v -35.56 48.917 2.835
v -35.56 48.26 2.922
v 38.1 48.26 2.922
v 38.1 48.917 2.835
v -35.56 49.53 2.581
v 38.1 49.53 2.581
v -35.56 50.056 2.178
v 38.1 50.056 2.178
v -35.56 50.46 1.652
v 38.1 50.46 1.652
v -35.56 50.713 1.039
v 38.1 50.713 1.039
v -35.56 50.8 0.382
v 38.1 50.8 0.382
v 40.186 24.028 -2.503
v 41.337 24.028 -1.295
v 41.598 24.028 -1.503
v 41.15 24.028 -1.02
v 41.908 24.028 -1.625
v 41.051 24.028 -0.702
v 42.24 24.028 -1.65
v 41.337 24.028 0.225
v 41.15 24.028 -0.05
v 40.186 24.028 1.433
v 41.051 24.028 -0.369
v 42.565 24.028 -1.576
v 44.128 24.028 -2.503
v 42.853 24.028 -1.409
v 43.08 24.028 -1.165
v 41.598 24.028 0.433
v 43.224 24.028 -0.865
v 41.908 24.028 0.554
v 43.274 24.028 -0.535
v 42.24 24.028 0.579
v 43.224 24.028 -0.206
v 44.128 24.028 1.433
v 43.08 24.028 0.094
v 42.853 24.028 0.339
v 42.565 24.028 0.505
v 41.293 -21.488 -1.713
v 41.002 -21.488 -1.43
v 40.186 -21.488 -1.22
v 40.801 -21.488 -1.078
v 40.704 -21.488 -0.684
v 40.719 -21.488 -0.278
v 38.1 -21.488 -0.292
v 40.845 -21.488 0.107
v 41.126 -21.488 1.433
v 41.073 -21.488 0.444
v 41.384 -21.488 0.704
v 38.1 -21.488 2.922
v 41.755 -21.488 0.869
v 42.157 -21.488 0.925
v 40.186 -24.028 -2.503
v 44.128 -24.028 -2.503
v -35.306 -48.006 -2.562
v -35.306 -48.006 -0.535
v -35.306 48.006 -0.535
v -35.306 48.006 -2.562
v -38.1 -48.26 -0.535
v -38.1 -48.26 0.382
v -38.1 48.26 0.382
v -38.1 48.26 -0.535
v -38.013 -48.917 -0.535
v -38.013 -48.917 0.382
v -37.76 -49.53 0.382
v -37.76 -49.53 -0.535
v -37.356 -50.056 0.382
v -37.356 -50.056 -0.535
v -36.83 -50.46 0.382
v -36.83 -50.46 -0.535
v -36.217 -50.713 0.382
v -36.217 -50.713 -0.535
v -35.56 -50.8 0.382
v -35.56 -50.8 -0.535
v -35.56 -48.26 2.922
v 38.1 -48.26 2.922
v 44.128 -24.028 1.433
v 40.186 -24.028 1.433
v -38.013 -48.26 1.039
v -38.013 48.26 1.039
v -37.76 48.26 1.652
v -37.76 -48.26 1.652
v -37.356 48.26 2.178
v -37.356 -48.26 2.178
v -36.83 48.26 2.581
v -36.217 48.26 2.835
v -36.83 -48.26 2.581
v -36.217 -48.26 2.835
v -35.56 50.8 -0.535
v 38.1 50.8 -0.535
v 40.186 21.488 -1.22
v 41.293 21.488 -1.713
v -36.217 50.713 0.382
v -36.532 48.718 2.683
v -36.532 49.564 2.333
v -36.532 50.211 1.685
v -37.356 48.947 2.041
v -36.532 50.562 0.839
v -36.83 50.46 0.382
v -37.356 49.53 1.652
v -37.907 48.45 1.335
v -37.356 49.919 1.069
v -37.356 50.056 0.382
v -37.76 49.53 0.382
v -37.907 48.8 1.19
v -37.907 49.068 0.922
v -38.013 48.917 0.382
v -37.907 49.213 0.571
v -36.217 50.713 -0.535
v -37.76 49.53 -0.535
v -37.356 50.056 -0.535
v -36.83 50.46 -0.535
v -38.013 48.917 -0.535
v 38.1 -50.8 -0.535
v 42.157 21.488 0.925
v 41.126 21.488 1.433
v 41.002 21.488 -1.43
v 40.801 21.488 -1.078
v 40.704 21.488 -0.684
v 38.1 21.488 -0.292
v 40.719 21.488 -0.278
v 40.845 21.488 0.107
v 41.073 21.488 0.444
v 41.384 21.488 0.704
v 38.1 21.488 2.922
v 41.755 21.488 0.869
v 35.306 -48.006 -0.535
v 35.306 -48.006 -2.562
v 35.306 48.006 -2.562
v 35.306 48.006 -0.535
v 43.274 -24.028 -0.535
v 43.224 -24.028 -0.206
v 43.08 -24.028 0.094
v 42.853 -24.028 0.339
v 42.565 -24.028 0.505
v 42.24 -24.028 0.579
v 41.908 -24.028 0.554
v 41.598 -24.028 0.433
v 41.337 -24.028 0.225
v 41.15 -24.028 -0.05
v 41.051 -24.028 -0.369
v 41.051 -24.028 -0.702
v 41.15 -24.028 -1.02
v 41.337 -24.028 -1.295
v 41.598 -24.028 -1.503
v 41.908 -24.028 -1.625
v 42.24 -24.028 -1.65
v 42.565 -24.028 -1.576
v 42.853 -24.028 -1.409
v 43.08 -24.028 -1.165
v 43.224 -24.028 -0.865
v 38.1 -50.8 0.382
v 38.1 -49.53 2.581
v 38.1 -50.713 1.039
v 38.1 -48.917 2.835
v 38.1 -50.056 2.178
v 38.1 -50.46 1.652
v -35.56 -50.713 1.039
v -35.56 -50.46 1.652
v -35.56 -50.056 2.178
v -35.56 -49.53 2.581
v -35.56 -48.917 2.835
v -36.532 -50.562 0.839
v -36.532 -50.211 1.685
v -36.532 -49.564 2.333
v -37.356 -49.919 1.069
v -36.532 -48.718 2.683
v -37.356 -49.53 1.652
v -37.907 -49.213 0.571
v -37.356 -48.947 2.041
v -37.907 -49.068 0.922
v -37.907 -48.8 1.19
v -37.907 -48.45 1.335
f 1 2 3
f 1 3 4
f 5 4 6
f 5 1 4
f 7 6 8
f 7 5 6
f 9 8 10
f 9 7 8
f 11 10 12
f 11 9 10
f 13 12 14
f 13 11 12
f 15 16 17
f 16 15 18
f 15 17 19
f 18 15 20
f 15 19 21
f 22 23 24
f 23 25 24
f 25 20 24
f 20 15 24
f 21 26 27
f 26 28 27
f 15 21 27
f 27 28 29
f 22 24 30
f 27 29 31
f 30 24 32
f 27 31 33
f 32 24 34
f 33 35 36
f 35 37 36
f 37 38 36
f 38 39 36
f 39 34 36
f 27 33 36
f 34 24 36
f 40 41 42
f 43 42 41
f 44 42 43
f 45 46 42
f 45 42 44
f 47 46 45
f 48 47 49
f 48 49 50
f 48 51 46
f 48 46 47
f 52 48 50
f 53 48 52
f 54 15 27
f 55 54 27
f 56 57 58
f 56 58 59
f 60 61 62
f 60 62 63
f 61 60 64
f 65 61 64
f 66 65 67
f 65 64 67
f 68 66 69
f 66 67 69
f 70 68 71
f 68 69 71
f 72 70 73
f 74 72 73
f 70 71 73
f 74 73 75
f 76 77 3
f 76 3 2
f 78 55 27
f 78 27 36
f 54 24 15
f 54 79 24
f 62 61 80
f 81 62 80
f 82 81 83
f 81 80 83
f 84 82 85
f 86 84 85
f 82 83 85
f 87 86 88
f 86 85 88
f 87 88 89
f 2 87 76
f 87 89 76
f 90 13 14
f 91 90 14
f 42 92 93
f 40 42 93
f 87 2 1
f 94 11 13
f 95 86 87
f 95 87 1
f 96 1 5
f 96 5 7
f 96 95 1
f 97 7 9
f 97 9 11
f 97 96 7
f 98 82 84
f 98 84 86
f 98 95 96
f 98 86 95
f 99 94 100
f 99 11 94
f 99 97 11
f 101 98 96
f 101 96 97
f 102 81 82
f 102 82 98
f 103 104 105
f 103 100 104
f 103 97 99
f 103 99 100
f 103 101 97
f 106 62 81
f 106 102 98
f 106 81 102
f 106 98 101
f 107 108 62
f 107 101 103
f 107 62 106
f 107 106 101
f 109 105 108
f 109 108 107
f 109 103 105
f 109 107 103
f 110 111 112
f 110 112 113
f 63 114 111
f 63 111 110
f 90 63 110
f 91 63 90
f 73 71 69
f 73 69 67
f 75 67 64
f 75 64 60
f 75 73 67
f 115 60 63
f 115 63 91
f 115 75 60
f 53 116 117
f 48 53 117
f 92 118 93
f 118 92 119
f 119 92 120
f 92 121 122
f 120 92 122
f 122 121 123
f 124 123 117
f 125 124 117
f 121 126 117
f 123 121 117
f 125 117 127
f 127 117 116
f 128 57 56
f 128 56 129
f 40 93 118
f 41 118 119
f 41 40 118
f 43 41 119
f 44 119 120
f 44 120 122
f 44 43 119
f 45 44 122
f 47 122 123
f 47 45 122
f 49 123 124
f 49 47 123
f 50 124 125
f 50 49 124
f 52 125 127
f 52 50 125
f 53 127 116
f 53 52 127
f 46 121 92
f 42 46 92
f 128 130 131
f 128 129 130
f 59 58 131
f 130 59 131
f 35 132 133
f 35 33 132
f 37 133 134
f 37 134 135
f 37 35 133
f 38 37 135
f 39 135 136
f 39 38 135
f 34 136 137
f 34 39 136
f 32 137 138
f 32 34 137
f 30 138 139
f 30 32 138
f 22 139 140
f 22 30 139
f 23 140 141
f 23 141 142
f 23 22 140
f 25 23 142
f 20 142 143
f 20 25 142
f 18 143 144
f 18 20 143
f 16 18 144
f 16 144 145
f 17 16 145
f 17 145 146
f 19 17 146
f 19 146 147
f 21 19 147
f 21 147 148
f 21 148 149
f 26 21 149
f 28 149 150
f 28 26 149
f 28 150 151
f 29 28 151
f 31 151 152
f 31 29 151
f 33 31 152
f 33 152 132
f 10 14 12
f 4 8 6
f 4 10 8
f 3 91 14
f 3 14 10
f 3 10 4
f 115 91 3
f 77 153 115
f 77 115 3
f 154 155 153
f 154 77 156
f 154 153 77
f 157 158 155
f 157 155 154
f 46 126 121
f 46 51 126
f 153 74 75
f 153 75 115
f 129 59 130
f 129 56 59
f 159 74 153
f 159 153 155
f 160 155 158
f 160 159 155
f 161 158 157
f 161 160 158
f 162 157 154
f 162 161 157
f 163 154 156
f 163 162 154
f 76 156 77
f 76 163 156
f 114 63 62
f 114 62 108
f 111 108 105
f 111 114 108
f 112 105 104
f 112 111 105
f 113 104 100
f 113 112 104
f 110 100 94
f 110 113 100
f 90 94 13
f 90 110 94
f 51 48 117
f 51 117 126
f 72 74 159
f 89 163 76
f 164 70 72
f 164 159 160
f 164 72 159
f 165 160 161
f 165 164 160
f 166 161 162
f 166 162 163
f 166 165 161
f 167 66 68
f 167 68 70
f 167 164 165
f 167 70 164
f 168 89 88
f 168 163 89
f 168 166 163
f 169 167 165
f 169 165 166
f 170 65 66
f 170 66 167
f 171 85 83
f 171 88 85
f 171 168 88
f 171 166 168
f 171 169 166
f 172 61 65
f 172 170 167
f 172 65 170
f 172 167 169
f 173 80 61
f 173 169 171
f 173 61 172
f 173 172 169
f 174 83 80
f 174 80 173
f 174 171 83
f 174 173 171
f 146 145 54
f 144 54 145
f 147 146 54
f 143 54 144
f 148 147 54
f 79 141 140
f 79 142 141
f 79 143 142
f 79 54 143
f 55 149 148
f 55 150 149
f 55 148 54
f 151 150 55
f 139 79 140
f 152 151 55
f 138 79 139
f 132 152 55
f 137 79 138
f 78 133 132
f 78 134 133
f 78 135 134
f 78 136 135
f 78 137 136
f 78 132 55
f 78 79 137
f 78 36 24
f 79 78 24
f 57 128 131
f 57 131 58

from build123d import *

# Parameters (mm, degrees)
F1_DEPTH     = 50.8
F2_DEPTH     = 48.006
F3_R         = 2.54
F4_T1_DEPTH  = 7.2669304909
F4_S5_W      = 2.54
F4_S5_H      = 2.54
F4_T6_DEPTH  = 2.54
F4_S11_W     = 2.54
F4_S11_H     = 2.54
F4_T12_DEPTH = 2.54
F0_R         = 1.1176
F5_DEPTH     = 24.0284
F6_DEPTH     = 21.4884


# Not quite as in the source:
# - a fillet or chamfer that OpenCascade refuses, or shapes differently, is made with other operations: its cross-section is extruded or revolved along the edge and cut away or added
# - ends of sketch curves that miss each other by under 0.0002 mm in the source are joined


with BuildPart() as f1:
    # F0 (on Front) → F1 (new body, symmetric)
    with BuildSketch(Plane.XZ):
        Polygon((35.306, -0.5352410823), (38.1, -0.5352410823), (38.1, -0.2915388458), (38.1, 2.9216894086), (-38.1, 2.9216894086), (-38.1, -0.5352410823), (-35.306, -0.5352410823), align=None)
    extrude(amount=F1_DEPTH, both=True)

    # F3
    f3_edges = [f1.edges().sort_by_distance(p)[0] for p in [
        (0, 50.8, 2.921689),
        (-38.1, 0, 2.921689),
        (0, -50.8, 2.921689),
    ]]
    fillet(f3_edges, radius=F3_R)

    # F4: fillet of radius 2.54 on 4 edges, made by hand

    # F4_s2 → F4_t1 (cut)
    with BuildSketch(Plane.XY.offset(-6.8852410823)):
        with BuildLine():
            ThreePointArc((-38.1, 48.26), (-37.3560512242, 50.0560512242), (-35.56, 50.8))
            Line((-35.56, 50.8), (-38.1, 50.8))
            Line((-38.1, 50.8), (-38.1, 48.26))
        make_face()
        with BuildLine():
            ThreePointArc((-38.1, -48.26), (-37.3560512242, -50.0560512242), (-35.56, -50.8))
            Line((-35.56, -50.8), (-38.1, -50.8))
            Line((-38.1, -50.8), (-38.1, -48.26))
        make_face()
    extrude(amount=F4_T1_DEPTH, mode=Mode.SUBTRACT)


with BuildPart() as f2:
    # F0 (on Front) → F2 (new body, symmetric)
    with BuildSketch(Plane.XZ):
        Polygon((35.306, -2.5619280059), (35.306, -0.5352806766), (-35.306, -0.5352410823), (-35.306, -2.5619280059), align=None)
    extrude(amount=F2_DEPTH, both=True)


with BuildPart() as f4_tool4:
    # F4_s5 → F4_t6 (new body)
    with BuildSketch(Plane.YZ.offset(-35.56)):
        with Locations((49.53, 1.6516894086)):
            Rectangle(F4_S5_W, F4_S5_H)
    extrude(amount=-F4_T6_DEPTH)

    # F4_s7 → F4_t8 (revolve, cut)
    with BuildSketch(Plane(origin=(-35.56, 48.26, 0.3816894086), x_dir=(0, -0.7071067812, -0.7071067812), z_dir=(0, 0.7071067812, -0.7071067812))):
        with BuildLine():
            ThreePointArc((0, -2.54), (2.54, 0), (0, 2.54))
            Line((0, 2.54), (0, -2.54))
        make_face()
    revolve(axis=Axis((-35.56, 48.26, 0.3816894086), (-1, 0, 0)), mode=Mode.SUBTRACT)


with BuildPart() as f1_1:
    add(f1.part)

    # F4_t3: cut F4_tool4
    add(f4_tool4.part, mode=Mode.SUBTRACT)


with BuildPart() as f4_tool10:
    # F4_s11 → F4_t12 (new body)
    with BuildSketch(Plane.YZ.offset(-35.56)):
        with Locations((-49.53, 1.6516894086)):
            Rectangle(F4_S11_W, F4_S11_H)
    extrude(amount=-F4_T12_DEPTH)

    # F4_s13 → F4_t14 (revolve, cut)
    with BuildSketch(Plane(origin=(-35.56, -48.26, 0.3816894086), x_dir=(0, 0.7071067812, -0.7071067812), z_dir=(0, 0.7071067812, 0.7071067812))):
        with BuildLine():
            ThreePointArc((0, -2.54), (2.54, 0), (0, 2.54))
            Line((0, 2.54), (0, -2.54))
        make_face()
    revolve(axis=Axis((-35.56, -48.26, 0.3816894086), (-1, 0, 0)), mode=Mode.SUBTRACT)


with BuildPart() as f1_2:
    add(f1_1.part)

    # F4_t9: cut F4_tool10
    add(f4_tool10.part, mode=Mode.SUBTRACT)


with BuildPart() as f5:
    # F0 (on Front) → F5 (new body, symmetric)
    with BuildSketch(Plane.XZ):
        with BuildLine():
            ThreePointArc((42.156539749, 0.9252589177), (40.7684698267, -0.0810141116), (41.2931384536, -1.7132047715))
            ThreePointArc((41.2931384536, -1.7132047715), (42.8168664325, -1.8379417083), (43.617039749, -0.5352410823))
            ThreePointArc((43.617039749, -0.5352410823), (43.1892692029, 0.4974883716), (42.156539749, 0.9252589177))
        make_face()
        with Locations((42.156539749, -0.5352410823)):
            Circle(F0_R, mode=Mode.SUBTRACT)
        with BuildLine():
            Line((40.1855779506, 1.4325042982), (40.1855779506, -1.2200908491))
            Line((40.1855779506, -1.2200908491), (41.2931384536, -1.7132047715))
            ThreePointArc((41.2931384536, -1.7132047715), (40.7684698267, -0.0810141116), (42.156539749, 0.9252589177))
            Line((42.156539749, 0.9252589177), (41.1258697318, 1.4325042982))
            Line((41.1258697318, 1.4325042982), (40.1855779506, 1.4325042982))
        make_face()
        with BuildLine():
            Line((41.2931384536, -1.7132047715), (40.1855779506, -1.2200908491))
            Line((40.1855779506, -1.2200908491), (40.1855779506, -2.5029864628))
            Line((40.1855779506, -2.5029864628), (44.1275015473, -2.5029864628))
            Line((44.1275015473, -2.5029864628), (44.1275015473, 1.4325042982))
            Line((44.1275015473, 1.4325042982), (41.1258697318, 1.4325042982))
            Line((41.1258697318, 1.4325042982), (42.156539749, 0.9252589177))
            ThreePointArc((42.156539749, 0.9252589177), (43.1892692029, 0.4974883716), (43.617039749, -0.5352410823))
            ThreePointArc((43.617039749, -0.5352410823), (42.8168664325, -1.8379417083), (41.2931384536, -1.7132047715))
        make_face()
    extrude(amount=F5_DEPTH, both=True)


with BuildPart() as f6:
    # F0 (on Front) → F6 (new body, symmetric)
    with BuildSketch(Plane.XZ):
        with BuildLine():
            Line((40.1855779506, 1.4325042982), (40.1855779506, -1.2200908491))
            Line((40.1855779506, -1.2200908491), (41.2931384536, -1.7132047715))
            ThreePointArc((41.2931384536, -1.7132047715), (40.7684698267, -0.0810141116), (42.156539749, 0.9252589177))
            Line((42.156539749, 0.9252589177), (41.1258697318, 1.4325042982))
            Line((41.1258697318, 1.4325042982), (40.1855779506, 1.4325042982))
        make_face()
        Polygon((38.1, 2.9216894086), (38.1, -0.2915388458), (40.1855779506, -1.2200908491), (40.1855779506, 1.4325042982), (41.1258697318, 1.4325042982), align=None)
    extrude(amount=F6_DEPTH, both=True)


solid = Compound([f2.part, f1_2.part, f5.part, f6.part])
